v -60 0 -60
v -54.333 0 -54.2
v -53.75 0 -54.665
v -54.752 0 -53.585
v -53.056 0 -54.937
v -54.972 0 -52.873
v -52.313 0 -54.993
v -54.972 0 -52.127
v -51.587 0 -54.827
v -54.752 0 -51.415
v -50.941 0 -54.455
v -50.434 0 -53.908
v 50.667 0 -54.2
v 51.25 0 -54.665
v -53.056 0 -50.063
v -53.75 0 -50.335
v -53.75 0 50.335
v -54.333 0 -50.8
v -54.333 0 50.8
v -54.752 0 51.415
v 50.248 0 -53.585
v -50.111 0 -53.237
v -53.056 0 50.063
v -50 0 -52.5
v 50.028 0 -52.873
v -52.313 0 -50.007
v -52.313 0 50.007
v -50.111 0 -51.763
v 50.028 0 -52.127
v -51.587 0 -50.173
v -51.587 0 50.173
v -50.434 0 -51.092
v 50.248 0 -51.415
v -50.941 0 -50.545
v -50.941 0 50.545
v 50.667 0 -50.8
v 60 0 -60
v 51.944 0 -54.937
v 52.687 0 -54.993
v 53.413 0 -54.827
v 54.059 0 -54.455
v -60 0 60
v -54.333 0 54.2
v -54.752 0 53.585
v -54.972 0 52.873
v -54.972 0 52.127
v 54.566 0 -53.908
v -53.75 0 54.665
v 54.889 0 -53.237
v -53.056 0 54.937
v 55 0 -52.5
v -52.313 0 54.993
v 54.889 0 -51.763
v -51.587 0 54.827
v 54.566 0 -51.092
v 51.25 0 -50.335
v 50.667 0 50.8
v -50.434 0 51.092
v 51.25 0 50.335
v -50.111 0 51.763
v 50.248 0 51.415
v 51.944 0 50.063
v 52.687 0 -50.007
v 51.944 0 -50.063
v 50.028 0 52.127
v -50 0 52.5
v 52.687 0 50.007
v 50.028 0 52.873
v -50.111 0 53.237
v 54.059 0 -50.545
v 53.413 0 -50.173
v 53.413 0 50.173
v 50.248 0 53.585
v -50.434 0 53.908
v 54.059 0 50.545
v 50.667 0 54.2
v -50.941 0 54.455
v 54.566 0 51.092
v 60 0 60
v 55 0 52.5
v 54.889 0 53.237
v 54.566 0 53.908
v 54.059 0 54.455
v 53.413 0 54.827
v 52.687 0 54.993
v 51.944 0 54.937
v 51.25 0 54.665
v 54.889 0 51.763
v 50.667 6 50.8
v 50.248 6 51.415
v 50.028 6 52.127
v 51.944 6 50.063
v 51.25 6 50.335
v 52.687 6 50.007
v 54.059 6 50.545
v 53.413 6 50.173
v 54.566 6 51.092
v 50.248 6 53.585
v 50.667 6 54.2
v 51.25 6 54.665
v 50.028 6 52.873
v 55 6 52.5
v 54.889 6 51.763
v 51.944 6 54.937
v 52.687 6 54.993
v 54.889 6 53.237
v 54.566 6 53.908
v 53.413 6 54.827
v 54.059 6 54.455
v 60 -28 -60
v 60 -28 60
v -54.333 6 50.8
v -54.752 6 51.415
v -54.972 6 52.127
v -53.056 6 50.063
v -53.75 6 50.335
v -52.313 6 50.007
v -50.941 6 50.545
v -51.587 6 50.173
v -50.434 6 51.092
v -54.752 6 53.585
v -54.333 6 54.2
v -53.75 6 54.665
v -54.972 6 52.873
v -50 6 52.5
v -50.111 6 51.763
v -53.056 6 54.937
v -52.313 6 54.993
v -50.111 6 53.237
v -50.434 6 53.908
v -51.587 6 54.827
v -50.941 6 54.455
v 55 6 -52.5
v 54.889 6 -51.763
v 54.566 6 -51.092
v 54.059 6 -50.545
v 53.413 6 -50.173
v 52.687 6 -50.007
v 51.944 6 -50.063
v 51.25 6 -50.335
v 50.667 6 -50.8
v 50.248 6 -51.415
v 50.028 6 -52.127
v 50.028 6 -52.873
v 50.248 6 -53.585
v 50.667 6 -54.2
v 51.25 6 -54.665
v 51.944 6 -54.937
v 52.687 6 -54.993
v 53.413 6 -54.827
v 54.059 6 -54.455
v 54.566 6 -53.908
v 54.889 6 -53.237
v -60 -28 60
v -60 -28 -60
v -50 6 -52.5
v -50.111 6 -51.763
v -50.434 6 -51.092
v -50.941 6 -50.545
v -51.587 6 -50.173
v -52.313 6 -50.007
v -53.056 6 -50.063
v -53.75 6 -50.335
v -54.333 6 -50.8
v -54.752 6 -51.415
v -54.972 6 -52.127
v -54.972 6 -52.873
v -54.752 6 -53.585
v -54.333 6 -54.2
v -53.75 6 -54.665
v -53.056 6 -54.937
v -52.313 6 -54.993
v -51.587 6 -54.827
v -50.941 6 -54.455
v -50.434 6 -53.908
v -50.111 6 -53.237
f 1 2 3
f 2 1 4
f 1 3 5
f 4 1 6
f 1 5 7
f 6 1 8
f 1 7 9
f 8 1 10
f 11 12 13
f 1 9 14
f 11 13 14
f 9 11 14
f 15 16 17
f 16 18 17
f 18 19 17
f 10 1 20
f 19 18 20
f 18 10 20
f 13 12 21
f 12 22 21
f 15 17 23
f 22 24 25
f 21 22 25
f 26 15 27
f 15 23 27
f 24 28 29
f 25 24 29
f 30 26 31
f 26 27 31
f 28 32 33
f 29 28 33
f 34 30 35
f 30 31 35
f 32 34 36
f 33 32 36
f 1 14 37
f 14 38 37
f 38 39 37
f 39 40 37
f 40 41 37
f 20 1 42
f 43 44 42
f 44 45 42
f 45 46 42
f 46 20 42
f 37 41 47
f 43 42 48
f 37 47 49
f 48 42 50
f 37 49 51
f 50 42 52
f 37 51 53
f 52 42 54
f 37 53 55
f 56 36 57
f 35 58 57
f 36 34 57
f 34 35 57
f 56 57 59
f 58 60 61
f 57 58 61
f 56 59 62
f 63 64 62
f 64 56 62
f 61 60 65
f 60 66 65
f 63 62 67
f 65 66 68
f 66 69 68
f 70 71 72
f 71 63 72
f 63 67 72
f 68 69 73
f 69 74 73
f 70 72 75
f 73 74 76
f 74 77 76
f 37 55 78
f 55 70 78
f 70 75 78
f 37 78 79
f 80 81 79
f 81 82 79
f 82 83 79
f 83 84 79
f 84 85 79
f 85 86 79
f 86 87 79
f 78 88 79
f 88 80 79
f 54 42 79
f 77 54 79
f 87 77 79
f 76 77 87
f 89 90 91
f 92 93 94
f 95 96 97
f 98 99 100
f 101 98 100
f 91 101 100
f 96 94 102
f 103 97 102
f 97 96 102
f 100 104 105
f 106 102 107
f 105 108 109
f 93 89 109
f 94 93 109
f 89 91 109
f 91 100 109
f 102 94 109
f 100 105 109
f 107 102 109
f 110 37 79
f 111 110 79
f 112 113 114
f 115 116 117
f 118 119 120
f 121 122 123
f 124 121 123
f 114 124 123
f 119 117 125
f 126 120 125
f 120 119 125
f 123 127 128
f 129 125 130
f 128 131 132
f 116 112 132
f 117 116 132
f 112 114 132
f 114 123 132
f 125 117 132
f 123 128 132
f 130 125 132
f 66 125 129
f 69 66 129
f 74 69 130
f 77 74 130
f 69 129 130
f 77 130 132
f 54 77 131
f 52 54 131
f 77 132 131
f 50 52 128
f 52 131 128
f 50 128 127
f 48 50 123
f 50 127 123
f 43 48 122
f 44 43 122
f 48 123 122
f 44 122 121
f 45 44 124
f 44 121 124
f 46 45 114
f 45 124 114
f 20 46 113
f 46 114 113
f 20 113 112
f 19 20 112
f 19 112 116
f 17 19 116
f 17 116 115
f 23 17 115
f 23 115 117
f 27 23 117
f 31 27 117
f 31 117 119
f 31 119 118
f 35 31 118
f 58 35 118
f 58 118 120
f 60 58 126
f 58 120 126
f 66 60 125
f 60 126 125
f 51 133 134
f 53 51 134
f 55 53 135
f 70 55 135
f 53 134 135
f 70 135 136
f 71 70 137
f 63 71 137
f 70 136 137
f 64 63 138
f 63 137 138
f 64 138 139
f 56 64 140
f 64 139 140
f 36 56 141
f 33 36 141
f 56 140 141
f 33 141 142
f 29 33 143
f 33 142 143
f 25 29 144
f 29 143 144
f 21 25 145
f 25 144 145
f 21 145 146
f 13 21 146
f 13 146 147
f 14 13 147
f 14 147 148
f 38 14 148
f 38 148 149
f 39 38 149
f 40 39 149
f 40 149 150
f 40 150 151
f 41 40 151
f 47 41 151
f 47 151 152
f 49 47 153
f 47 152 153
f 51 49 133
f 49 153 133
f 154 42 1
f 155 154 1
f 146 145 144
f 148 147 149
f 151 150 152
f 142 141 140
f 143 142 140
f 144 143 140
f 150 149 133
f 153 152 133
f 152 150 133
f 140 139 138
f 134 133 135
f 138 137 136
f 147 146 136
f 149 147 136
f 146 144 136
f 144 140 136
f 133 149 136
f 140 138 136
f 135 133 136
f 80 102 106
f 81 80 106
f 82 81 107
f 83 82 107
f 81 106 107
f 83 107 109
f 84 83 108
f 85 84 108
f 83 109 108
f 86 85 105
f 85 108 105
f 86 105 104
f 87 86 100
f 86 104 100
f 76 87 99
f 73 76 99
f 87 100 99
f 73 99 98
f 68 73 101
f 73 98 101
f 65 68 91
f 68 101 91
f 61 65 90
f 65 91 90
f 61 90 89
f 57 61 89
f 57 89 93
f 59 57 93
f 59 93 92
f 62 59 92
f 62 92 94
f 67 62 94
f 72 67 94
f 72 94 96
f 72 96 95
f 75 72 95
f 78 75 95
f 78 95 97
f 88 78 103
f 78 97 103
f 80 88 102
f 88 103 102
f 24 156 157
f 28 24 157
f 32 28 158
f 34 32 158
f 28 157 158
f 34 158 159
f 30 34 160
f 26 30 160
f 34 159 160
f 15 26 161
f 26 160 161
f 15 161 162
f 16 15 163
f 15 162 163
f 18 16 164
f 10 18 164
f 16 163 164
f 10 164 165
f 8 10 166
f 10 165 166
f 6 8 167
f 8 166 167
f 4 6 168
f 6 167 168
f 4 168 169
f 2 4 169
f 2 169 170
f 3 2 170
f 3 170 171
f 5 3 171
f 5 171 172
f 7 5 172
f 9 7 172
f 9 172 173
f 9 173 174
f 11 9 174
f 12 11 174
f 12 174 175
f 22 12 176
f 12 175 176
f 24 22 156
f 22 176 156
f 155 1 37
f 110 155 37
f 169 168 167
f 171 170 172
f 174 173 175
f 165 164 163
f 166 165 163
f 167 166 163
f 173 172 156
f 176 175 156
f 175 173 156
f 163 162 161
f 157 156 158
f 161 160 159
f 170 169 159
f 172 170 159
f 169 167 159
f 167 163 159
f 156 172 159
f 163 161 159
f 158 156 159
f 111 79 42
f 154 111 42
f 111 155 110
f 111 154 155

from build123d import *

# Parameters (mm, degrees)
PAD_DEPTH         = 28
CYLINDER_R        = 2.5
CYLINDER_DEPTH    = 6
CYLINDER001_R     = 2.5
CYLINDER001_DEPTH = 6
CYLINDER002_R     = 2.5
CYLINDER002_DEPTH = 6
CYLINDER003_R     = 2.5
CYLINDER003_DEPTH = 6


with BuildPart() as part:
    # Sketch → Pad (new body)
    with BuildSketch(Plane.XZ):
        Polygon((-60, 0), (-60, -60), (60, -60), (60, 60), (-60, 60), align=None)
    extrude(amount=PAD_DEPTH)

    # Cylinder → Cylinder (join)
    with BuildSketch(Plane(origin=(-52.5, 6, 52.5), x_dir=(1, 0, 0), z_dir=(0, -1, 0))):
        Circle(CYLINDER_R)
    extrude(amount=CYLINDER_DEPTH)

    # Cylinder001 → Cylinder001 (join)
    with BuildSketch(Plane(origin=(52.5, 6, 52.5), x_dir=(1, 0, 0), z_dir=(0, -1, 0))):
        Circle(CYLINDER001_R)
    extrude(amount=CYLINDER001_DEPTH)

    # Cylinder002 → Cylinder002 (join)
    with BuildSketch(Plane(origin=(52.5, 6, -52.5), x_dir=(1, 0, 0), z_dir=(0, -1, 0))):
        Circle(CYLINDER002_R)
    extrude(amount=CYLINDER002_DEPTH)

    # Cylinder003 → Cylinder003 (join)
    with BuildSketch(Plane(origin=(-52.5, 6, -52.5), x_dir=(1, 0, 0), z_dir=(0, -1, 0))):
        Circle(CYLINDER003_R)
    extrude(amount=CYLINDER003_DEPTH)


solid = part.part
